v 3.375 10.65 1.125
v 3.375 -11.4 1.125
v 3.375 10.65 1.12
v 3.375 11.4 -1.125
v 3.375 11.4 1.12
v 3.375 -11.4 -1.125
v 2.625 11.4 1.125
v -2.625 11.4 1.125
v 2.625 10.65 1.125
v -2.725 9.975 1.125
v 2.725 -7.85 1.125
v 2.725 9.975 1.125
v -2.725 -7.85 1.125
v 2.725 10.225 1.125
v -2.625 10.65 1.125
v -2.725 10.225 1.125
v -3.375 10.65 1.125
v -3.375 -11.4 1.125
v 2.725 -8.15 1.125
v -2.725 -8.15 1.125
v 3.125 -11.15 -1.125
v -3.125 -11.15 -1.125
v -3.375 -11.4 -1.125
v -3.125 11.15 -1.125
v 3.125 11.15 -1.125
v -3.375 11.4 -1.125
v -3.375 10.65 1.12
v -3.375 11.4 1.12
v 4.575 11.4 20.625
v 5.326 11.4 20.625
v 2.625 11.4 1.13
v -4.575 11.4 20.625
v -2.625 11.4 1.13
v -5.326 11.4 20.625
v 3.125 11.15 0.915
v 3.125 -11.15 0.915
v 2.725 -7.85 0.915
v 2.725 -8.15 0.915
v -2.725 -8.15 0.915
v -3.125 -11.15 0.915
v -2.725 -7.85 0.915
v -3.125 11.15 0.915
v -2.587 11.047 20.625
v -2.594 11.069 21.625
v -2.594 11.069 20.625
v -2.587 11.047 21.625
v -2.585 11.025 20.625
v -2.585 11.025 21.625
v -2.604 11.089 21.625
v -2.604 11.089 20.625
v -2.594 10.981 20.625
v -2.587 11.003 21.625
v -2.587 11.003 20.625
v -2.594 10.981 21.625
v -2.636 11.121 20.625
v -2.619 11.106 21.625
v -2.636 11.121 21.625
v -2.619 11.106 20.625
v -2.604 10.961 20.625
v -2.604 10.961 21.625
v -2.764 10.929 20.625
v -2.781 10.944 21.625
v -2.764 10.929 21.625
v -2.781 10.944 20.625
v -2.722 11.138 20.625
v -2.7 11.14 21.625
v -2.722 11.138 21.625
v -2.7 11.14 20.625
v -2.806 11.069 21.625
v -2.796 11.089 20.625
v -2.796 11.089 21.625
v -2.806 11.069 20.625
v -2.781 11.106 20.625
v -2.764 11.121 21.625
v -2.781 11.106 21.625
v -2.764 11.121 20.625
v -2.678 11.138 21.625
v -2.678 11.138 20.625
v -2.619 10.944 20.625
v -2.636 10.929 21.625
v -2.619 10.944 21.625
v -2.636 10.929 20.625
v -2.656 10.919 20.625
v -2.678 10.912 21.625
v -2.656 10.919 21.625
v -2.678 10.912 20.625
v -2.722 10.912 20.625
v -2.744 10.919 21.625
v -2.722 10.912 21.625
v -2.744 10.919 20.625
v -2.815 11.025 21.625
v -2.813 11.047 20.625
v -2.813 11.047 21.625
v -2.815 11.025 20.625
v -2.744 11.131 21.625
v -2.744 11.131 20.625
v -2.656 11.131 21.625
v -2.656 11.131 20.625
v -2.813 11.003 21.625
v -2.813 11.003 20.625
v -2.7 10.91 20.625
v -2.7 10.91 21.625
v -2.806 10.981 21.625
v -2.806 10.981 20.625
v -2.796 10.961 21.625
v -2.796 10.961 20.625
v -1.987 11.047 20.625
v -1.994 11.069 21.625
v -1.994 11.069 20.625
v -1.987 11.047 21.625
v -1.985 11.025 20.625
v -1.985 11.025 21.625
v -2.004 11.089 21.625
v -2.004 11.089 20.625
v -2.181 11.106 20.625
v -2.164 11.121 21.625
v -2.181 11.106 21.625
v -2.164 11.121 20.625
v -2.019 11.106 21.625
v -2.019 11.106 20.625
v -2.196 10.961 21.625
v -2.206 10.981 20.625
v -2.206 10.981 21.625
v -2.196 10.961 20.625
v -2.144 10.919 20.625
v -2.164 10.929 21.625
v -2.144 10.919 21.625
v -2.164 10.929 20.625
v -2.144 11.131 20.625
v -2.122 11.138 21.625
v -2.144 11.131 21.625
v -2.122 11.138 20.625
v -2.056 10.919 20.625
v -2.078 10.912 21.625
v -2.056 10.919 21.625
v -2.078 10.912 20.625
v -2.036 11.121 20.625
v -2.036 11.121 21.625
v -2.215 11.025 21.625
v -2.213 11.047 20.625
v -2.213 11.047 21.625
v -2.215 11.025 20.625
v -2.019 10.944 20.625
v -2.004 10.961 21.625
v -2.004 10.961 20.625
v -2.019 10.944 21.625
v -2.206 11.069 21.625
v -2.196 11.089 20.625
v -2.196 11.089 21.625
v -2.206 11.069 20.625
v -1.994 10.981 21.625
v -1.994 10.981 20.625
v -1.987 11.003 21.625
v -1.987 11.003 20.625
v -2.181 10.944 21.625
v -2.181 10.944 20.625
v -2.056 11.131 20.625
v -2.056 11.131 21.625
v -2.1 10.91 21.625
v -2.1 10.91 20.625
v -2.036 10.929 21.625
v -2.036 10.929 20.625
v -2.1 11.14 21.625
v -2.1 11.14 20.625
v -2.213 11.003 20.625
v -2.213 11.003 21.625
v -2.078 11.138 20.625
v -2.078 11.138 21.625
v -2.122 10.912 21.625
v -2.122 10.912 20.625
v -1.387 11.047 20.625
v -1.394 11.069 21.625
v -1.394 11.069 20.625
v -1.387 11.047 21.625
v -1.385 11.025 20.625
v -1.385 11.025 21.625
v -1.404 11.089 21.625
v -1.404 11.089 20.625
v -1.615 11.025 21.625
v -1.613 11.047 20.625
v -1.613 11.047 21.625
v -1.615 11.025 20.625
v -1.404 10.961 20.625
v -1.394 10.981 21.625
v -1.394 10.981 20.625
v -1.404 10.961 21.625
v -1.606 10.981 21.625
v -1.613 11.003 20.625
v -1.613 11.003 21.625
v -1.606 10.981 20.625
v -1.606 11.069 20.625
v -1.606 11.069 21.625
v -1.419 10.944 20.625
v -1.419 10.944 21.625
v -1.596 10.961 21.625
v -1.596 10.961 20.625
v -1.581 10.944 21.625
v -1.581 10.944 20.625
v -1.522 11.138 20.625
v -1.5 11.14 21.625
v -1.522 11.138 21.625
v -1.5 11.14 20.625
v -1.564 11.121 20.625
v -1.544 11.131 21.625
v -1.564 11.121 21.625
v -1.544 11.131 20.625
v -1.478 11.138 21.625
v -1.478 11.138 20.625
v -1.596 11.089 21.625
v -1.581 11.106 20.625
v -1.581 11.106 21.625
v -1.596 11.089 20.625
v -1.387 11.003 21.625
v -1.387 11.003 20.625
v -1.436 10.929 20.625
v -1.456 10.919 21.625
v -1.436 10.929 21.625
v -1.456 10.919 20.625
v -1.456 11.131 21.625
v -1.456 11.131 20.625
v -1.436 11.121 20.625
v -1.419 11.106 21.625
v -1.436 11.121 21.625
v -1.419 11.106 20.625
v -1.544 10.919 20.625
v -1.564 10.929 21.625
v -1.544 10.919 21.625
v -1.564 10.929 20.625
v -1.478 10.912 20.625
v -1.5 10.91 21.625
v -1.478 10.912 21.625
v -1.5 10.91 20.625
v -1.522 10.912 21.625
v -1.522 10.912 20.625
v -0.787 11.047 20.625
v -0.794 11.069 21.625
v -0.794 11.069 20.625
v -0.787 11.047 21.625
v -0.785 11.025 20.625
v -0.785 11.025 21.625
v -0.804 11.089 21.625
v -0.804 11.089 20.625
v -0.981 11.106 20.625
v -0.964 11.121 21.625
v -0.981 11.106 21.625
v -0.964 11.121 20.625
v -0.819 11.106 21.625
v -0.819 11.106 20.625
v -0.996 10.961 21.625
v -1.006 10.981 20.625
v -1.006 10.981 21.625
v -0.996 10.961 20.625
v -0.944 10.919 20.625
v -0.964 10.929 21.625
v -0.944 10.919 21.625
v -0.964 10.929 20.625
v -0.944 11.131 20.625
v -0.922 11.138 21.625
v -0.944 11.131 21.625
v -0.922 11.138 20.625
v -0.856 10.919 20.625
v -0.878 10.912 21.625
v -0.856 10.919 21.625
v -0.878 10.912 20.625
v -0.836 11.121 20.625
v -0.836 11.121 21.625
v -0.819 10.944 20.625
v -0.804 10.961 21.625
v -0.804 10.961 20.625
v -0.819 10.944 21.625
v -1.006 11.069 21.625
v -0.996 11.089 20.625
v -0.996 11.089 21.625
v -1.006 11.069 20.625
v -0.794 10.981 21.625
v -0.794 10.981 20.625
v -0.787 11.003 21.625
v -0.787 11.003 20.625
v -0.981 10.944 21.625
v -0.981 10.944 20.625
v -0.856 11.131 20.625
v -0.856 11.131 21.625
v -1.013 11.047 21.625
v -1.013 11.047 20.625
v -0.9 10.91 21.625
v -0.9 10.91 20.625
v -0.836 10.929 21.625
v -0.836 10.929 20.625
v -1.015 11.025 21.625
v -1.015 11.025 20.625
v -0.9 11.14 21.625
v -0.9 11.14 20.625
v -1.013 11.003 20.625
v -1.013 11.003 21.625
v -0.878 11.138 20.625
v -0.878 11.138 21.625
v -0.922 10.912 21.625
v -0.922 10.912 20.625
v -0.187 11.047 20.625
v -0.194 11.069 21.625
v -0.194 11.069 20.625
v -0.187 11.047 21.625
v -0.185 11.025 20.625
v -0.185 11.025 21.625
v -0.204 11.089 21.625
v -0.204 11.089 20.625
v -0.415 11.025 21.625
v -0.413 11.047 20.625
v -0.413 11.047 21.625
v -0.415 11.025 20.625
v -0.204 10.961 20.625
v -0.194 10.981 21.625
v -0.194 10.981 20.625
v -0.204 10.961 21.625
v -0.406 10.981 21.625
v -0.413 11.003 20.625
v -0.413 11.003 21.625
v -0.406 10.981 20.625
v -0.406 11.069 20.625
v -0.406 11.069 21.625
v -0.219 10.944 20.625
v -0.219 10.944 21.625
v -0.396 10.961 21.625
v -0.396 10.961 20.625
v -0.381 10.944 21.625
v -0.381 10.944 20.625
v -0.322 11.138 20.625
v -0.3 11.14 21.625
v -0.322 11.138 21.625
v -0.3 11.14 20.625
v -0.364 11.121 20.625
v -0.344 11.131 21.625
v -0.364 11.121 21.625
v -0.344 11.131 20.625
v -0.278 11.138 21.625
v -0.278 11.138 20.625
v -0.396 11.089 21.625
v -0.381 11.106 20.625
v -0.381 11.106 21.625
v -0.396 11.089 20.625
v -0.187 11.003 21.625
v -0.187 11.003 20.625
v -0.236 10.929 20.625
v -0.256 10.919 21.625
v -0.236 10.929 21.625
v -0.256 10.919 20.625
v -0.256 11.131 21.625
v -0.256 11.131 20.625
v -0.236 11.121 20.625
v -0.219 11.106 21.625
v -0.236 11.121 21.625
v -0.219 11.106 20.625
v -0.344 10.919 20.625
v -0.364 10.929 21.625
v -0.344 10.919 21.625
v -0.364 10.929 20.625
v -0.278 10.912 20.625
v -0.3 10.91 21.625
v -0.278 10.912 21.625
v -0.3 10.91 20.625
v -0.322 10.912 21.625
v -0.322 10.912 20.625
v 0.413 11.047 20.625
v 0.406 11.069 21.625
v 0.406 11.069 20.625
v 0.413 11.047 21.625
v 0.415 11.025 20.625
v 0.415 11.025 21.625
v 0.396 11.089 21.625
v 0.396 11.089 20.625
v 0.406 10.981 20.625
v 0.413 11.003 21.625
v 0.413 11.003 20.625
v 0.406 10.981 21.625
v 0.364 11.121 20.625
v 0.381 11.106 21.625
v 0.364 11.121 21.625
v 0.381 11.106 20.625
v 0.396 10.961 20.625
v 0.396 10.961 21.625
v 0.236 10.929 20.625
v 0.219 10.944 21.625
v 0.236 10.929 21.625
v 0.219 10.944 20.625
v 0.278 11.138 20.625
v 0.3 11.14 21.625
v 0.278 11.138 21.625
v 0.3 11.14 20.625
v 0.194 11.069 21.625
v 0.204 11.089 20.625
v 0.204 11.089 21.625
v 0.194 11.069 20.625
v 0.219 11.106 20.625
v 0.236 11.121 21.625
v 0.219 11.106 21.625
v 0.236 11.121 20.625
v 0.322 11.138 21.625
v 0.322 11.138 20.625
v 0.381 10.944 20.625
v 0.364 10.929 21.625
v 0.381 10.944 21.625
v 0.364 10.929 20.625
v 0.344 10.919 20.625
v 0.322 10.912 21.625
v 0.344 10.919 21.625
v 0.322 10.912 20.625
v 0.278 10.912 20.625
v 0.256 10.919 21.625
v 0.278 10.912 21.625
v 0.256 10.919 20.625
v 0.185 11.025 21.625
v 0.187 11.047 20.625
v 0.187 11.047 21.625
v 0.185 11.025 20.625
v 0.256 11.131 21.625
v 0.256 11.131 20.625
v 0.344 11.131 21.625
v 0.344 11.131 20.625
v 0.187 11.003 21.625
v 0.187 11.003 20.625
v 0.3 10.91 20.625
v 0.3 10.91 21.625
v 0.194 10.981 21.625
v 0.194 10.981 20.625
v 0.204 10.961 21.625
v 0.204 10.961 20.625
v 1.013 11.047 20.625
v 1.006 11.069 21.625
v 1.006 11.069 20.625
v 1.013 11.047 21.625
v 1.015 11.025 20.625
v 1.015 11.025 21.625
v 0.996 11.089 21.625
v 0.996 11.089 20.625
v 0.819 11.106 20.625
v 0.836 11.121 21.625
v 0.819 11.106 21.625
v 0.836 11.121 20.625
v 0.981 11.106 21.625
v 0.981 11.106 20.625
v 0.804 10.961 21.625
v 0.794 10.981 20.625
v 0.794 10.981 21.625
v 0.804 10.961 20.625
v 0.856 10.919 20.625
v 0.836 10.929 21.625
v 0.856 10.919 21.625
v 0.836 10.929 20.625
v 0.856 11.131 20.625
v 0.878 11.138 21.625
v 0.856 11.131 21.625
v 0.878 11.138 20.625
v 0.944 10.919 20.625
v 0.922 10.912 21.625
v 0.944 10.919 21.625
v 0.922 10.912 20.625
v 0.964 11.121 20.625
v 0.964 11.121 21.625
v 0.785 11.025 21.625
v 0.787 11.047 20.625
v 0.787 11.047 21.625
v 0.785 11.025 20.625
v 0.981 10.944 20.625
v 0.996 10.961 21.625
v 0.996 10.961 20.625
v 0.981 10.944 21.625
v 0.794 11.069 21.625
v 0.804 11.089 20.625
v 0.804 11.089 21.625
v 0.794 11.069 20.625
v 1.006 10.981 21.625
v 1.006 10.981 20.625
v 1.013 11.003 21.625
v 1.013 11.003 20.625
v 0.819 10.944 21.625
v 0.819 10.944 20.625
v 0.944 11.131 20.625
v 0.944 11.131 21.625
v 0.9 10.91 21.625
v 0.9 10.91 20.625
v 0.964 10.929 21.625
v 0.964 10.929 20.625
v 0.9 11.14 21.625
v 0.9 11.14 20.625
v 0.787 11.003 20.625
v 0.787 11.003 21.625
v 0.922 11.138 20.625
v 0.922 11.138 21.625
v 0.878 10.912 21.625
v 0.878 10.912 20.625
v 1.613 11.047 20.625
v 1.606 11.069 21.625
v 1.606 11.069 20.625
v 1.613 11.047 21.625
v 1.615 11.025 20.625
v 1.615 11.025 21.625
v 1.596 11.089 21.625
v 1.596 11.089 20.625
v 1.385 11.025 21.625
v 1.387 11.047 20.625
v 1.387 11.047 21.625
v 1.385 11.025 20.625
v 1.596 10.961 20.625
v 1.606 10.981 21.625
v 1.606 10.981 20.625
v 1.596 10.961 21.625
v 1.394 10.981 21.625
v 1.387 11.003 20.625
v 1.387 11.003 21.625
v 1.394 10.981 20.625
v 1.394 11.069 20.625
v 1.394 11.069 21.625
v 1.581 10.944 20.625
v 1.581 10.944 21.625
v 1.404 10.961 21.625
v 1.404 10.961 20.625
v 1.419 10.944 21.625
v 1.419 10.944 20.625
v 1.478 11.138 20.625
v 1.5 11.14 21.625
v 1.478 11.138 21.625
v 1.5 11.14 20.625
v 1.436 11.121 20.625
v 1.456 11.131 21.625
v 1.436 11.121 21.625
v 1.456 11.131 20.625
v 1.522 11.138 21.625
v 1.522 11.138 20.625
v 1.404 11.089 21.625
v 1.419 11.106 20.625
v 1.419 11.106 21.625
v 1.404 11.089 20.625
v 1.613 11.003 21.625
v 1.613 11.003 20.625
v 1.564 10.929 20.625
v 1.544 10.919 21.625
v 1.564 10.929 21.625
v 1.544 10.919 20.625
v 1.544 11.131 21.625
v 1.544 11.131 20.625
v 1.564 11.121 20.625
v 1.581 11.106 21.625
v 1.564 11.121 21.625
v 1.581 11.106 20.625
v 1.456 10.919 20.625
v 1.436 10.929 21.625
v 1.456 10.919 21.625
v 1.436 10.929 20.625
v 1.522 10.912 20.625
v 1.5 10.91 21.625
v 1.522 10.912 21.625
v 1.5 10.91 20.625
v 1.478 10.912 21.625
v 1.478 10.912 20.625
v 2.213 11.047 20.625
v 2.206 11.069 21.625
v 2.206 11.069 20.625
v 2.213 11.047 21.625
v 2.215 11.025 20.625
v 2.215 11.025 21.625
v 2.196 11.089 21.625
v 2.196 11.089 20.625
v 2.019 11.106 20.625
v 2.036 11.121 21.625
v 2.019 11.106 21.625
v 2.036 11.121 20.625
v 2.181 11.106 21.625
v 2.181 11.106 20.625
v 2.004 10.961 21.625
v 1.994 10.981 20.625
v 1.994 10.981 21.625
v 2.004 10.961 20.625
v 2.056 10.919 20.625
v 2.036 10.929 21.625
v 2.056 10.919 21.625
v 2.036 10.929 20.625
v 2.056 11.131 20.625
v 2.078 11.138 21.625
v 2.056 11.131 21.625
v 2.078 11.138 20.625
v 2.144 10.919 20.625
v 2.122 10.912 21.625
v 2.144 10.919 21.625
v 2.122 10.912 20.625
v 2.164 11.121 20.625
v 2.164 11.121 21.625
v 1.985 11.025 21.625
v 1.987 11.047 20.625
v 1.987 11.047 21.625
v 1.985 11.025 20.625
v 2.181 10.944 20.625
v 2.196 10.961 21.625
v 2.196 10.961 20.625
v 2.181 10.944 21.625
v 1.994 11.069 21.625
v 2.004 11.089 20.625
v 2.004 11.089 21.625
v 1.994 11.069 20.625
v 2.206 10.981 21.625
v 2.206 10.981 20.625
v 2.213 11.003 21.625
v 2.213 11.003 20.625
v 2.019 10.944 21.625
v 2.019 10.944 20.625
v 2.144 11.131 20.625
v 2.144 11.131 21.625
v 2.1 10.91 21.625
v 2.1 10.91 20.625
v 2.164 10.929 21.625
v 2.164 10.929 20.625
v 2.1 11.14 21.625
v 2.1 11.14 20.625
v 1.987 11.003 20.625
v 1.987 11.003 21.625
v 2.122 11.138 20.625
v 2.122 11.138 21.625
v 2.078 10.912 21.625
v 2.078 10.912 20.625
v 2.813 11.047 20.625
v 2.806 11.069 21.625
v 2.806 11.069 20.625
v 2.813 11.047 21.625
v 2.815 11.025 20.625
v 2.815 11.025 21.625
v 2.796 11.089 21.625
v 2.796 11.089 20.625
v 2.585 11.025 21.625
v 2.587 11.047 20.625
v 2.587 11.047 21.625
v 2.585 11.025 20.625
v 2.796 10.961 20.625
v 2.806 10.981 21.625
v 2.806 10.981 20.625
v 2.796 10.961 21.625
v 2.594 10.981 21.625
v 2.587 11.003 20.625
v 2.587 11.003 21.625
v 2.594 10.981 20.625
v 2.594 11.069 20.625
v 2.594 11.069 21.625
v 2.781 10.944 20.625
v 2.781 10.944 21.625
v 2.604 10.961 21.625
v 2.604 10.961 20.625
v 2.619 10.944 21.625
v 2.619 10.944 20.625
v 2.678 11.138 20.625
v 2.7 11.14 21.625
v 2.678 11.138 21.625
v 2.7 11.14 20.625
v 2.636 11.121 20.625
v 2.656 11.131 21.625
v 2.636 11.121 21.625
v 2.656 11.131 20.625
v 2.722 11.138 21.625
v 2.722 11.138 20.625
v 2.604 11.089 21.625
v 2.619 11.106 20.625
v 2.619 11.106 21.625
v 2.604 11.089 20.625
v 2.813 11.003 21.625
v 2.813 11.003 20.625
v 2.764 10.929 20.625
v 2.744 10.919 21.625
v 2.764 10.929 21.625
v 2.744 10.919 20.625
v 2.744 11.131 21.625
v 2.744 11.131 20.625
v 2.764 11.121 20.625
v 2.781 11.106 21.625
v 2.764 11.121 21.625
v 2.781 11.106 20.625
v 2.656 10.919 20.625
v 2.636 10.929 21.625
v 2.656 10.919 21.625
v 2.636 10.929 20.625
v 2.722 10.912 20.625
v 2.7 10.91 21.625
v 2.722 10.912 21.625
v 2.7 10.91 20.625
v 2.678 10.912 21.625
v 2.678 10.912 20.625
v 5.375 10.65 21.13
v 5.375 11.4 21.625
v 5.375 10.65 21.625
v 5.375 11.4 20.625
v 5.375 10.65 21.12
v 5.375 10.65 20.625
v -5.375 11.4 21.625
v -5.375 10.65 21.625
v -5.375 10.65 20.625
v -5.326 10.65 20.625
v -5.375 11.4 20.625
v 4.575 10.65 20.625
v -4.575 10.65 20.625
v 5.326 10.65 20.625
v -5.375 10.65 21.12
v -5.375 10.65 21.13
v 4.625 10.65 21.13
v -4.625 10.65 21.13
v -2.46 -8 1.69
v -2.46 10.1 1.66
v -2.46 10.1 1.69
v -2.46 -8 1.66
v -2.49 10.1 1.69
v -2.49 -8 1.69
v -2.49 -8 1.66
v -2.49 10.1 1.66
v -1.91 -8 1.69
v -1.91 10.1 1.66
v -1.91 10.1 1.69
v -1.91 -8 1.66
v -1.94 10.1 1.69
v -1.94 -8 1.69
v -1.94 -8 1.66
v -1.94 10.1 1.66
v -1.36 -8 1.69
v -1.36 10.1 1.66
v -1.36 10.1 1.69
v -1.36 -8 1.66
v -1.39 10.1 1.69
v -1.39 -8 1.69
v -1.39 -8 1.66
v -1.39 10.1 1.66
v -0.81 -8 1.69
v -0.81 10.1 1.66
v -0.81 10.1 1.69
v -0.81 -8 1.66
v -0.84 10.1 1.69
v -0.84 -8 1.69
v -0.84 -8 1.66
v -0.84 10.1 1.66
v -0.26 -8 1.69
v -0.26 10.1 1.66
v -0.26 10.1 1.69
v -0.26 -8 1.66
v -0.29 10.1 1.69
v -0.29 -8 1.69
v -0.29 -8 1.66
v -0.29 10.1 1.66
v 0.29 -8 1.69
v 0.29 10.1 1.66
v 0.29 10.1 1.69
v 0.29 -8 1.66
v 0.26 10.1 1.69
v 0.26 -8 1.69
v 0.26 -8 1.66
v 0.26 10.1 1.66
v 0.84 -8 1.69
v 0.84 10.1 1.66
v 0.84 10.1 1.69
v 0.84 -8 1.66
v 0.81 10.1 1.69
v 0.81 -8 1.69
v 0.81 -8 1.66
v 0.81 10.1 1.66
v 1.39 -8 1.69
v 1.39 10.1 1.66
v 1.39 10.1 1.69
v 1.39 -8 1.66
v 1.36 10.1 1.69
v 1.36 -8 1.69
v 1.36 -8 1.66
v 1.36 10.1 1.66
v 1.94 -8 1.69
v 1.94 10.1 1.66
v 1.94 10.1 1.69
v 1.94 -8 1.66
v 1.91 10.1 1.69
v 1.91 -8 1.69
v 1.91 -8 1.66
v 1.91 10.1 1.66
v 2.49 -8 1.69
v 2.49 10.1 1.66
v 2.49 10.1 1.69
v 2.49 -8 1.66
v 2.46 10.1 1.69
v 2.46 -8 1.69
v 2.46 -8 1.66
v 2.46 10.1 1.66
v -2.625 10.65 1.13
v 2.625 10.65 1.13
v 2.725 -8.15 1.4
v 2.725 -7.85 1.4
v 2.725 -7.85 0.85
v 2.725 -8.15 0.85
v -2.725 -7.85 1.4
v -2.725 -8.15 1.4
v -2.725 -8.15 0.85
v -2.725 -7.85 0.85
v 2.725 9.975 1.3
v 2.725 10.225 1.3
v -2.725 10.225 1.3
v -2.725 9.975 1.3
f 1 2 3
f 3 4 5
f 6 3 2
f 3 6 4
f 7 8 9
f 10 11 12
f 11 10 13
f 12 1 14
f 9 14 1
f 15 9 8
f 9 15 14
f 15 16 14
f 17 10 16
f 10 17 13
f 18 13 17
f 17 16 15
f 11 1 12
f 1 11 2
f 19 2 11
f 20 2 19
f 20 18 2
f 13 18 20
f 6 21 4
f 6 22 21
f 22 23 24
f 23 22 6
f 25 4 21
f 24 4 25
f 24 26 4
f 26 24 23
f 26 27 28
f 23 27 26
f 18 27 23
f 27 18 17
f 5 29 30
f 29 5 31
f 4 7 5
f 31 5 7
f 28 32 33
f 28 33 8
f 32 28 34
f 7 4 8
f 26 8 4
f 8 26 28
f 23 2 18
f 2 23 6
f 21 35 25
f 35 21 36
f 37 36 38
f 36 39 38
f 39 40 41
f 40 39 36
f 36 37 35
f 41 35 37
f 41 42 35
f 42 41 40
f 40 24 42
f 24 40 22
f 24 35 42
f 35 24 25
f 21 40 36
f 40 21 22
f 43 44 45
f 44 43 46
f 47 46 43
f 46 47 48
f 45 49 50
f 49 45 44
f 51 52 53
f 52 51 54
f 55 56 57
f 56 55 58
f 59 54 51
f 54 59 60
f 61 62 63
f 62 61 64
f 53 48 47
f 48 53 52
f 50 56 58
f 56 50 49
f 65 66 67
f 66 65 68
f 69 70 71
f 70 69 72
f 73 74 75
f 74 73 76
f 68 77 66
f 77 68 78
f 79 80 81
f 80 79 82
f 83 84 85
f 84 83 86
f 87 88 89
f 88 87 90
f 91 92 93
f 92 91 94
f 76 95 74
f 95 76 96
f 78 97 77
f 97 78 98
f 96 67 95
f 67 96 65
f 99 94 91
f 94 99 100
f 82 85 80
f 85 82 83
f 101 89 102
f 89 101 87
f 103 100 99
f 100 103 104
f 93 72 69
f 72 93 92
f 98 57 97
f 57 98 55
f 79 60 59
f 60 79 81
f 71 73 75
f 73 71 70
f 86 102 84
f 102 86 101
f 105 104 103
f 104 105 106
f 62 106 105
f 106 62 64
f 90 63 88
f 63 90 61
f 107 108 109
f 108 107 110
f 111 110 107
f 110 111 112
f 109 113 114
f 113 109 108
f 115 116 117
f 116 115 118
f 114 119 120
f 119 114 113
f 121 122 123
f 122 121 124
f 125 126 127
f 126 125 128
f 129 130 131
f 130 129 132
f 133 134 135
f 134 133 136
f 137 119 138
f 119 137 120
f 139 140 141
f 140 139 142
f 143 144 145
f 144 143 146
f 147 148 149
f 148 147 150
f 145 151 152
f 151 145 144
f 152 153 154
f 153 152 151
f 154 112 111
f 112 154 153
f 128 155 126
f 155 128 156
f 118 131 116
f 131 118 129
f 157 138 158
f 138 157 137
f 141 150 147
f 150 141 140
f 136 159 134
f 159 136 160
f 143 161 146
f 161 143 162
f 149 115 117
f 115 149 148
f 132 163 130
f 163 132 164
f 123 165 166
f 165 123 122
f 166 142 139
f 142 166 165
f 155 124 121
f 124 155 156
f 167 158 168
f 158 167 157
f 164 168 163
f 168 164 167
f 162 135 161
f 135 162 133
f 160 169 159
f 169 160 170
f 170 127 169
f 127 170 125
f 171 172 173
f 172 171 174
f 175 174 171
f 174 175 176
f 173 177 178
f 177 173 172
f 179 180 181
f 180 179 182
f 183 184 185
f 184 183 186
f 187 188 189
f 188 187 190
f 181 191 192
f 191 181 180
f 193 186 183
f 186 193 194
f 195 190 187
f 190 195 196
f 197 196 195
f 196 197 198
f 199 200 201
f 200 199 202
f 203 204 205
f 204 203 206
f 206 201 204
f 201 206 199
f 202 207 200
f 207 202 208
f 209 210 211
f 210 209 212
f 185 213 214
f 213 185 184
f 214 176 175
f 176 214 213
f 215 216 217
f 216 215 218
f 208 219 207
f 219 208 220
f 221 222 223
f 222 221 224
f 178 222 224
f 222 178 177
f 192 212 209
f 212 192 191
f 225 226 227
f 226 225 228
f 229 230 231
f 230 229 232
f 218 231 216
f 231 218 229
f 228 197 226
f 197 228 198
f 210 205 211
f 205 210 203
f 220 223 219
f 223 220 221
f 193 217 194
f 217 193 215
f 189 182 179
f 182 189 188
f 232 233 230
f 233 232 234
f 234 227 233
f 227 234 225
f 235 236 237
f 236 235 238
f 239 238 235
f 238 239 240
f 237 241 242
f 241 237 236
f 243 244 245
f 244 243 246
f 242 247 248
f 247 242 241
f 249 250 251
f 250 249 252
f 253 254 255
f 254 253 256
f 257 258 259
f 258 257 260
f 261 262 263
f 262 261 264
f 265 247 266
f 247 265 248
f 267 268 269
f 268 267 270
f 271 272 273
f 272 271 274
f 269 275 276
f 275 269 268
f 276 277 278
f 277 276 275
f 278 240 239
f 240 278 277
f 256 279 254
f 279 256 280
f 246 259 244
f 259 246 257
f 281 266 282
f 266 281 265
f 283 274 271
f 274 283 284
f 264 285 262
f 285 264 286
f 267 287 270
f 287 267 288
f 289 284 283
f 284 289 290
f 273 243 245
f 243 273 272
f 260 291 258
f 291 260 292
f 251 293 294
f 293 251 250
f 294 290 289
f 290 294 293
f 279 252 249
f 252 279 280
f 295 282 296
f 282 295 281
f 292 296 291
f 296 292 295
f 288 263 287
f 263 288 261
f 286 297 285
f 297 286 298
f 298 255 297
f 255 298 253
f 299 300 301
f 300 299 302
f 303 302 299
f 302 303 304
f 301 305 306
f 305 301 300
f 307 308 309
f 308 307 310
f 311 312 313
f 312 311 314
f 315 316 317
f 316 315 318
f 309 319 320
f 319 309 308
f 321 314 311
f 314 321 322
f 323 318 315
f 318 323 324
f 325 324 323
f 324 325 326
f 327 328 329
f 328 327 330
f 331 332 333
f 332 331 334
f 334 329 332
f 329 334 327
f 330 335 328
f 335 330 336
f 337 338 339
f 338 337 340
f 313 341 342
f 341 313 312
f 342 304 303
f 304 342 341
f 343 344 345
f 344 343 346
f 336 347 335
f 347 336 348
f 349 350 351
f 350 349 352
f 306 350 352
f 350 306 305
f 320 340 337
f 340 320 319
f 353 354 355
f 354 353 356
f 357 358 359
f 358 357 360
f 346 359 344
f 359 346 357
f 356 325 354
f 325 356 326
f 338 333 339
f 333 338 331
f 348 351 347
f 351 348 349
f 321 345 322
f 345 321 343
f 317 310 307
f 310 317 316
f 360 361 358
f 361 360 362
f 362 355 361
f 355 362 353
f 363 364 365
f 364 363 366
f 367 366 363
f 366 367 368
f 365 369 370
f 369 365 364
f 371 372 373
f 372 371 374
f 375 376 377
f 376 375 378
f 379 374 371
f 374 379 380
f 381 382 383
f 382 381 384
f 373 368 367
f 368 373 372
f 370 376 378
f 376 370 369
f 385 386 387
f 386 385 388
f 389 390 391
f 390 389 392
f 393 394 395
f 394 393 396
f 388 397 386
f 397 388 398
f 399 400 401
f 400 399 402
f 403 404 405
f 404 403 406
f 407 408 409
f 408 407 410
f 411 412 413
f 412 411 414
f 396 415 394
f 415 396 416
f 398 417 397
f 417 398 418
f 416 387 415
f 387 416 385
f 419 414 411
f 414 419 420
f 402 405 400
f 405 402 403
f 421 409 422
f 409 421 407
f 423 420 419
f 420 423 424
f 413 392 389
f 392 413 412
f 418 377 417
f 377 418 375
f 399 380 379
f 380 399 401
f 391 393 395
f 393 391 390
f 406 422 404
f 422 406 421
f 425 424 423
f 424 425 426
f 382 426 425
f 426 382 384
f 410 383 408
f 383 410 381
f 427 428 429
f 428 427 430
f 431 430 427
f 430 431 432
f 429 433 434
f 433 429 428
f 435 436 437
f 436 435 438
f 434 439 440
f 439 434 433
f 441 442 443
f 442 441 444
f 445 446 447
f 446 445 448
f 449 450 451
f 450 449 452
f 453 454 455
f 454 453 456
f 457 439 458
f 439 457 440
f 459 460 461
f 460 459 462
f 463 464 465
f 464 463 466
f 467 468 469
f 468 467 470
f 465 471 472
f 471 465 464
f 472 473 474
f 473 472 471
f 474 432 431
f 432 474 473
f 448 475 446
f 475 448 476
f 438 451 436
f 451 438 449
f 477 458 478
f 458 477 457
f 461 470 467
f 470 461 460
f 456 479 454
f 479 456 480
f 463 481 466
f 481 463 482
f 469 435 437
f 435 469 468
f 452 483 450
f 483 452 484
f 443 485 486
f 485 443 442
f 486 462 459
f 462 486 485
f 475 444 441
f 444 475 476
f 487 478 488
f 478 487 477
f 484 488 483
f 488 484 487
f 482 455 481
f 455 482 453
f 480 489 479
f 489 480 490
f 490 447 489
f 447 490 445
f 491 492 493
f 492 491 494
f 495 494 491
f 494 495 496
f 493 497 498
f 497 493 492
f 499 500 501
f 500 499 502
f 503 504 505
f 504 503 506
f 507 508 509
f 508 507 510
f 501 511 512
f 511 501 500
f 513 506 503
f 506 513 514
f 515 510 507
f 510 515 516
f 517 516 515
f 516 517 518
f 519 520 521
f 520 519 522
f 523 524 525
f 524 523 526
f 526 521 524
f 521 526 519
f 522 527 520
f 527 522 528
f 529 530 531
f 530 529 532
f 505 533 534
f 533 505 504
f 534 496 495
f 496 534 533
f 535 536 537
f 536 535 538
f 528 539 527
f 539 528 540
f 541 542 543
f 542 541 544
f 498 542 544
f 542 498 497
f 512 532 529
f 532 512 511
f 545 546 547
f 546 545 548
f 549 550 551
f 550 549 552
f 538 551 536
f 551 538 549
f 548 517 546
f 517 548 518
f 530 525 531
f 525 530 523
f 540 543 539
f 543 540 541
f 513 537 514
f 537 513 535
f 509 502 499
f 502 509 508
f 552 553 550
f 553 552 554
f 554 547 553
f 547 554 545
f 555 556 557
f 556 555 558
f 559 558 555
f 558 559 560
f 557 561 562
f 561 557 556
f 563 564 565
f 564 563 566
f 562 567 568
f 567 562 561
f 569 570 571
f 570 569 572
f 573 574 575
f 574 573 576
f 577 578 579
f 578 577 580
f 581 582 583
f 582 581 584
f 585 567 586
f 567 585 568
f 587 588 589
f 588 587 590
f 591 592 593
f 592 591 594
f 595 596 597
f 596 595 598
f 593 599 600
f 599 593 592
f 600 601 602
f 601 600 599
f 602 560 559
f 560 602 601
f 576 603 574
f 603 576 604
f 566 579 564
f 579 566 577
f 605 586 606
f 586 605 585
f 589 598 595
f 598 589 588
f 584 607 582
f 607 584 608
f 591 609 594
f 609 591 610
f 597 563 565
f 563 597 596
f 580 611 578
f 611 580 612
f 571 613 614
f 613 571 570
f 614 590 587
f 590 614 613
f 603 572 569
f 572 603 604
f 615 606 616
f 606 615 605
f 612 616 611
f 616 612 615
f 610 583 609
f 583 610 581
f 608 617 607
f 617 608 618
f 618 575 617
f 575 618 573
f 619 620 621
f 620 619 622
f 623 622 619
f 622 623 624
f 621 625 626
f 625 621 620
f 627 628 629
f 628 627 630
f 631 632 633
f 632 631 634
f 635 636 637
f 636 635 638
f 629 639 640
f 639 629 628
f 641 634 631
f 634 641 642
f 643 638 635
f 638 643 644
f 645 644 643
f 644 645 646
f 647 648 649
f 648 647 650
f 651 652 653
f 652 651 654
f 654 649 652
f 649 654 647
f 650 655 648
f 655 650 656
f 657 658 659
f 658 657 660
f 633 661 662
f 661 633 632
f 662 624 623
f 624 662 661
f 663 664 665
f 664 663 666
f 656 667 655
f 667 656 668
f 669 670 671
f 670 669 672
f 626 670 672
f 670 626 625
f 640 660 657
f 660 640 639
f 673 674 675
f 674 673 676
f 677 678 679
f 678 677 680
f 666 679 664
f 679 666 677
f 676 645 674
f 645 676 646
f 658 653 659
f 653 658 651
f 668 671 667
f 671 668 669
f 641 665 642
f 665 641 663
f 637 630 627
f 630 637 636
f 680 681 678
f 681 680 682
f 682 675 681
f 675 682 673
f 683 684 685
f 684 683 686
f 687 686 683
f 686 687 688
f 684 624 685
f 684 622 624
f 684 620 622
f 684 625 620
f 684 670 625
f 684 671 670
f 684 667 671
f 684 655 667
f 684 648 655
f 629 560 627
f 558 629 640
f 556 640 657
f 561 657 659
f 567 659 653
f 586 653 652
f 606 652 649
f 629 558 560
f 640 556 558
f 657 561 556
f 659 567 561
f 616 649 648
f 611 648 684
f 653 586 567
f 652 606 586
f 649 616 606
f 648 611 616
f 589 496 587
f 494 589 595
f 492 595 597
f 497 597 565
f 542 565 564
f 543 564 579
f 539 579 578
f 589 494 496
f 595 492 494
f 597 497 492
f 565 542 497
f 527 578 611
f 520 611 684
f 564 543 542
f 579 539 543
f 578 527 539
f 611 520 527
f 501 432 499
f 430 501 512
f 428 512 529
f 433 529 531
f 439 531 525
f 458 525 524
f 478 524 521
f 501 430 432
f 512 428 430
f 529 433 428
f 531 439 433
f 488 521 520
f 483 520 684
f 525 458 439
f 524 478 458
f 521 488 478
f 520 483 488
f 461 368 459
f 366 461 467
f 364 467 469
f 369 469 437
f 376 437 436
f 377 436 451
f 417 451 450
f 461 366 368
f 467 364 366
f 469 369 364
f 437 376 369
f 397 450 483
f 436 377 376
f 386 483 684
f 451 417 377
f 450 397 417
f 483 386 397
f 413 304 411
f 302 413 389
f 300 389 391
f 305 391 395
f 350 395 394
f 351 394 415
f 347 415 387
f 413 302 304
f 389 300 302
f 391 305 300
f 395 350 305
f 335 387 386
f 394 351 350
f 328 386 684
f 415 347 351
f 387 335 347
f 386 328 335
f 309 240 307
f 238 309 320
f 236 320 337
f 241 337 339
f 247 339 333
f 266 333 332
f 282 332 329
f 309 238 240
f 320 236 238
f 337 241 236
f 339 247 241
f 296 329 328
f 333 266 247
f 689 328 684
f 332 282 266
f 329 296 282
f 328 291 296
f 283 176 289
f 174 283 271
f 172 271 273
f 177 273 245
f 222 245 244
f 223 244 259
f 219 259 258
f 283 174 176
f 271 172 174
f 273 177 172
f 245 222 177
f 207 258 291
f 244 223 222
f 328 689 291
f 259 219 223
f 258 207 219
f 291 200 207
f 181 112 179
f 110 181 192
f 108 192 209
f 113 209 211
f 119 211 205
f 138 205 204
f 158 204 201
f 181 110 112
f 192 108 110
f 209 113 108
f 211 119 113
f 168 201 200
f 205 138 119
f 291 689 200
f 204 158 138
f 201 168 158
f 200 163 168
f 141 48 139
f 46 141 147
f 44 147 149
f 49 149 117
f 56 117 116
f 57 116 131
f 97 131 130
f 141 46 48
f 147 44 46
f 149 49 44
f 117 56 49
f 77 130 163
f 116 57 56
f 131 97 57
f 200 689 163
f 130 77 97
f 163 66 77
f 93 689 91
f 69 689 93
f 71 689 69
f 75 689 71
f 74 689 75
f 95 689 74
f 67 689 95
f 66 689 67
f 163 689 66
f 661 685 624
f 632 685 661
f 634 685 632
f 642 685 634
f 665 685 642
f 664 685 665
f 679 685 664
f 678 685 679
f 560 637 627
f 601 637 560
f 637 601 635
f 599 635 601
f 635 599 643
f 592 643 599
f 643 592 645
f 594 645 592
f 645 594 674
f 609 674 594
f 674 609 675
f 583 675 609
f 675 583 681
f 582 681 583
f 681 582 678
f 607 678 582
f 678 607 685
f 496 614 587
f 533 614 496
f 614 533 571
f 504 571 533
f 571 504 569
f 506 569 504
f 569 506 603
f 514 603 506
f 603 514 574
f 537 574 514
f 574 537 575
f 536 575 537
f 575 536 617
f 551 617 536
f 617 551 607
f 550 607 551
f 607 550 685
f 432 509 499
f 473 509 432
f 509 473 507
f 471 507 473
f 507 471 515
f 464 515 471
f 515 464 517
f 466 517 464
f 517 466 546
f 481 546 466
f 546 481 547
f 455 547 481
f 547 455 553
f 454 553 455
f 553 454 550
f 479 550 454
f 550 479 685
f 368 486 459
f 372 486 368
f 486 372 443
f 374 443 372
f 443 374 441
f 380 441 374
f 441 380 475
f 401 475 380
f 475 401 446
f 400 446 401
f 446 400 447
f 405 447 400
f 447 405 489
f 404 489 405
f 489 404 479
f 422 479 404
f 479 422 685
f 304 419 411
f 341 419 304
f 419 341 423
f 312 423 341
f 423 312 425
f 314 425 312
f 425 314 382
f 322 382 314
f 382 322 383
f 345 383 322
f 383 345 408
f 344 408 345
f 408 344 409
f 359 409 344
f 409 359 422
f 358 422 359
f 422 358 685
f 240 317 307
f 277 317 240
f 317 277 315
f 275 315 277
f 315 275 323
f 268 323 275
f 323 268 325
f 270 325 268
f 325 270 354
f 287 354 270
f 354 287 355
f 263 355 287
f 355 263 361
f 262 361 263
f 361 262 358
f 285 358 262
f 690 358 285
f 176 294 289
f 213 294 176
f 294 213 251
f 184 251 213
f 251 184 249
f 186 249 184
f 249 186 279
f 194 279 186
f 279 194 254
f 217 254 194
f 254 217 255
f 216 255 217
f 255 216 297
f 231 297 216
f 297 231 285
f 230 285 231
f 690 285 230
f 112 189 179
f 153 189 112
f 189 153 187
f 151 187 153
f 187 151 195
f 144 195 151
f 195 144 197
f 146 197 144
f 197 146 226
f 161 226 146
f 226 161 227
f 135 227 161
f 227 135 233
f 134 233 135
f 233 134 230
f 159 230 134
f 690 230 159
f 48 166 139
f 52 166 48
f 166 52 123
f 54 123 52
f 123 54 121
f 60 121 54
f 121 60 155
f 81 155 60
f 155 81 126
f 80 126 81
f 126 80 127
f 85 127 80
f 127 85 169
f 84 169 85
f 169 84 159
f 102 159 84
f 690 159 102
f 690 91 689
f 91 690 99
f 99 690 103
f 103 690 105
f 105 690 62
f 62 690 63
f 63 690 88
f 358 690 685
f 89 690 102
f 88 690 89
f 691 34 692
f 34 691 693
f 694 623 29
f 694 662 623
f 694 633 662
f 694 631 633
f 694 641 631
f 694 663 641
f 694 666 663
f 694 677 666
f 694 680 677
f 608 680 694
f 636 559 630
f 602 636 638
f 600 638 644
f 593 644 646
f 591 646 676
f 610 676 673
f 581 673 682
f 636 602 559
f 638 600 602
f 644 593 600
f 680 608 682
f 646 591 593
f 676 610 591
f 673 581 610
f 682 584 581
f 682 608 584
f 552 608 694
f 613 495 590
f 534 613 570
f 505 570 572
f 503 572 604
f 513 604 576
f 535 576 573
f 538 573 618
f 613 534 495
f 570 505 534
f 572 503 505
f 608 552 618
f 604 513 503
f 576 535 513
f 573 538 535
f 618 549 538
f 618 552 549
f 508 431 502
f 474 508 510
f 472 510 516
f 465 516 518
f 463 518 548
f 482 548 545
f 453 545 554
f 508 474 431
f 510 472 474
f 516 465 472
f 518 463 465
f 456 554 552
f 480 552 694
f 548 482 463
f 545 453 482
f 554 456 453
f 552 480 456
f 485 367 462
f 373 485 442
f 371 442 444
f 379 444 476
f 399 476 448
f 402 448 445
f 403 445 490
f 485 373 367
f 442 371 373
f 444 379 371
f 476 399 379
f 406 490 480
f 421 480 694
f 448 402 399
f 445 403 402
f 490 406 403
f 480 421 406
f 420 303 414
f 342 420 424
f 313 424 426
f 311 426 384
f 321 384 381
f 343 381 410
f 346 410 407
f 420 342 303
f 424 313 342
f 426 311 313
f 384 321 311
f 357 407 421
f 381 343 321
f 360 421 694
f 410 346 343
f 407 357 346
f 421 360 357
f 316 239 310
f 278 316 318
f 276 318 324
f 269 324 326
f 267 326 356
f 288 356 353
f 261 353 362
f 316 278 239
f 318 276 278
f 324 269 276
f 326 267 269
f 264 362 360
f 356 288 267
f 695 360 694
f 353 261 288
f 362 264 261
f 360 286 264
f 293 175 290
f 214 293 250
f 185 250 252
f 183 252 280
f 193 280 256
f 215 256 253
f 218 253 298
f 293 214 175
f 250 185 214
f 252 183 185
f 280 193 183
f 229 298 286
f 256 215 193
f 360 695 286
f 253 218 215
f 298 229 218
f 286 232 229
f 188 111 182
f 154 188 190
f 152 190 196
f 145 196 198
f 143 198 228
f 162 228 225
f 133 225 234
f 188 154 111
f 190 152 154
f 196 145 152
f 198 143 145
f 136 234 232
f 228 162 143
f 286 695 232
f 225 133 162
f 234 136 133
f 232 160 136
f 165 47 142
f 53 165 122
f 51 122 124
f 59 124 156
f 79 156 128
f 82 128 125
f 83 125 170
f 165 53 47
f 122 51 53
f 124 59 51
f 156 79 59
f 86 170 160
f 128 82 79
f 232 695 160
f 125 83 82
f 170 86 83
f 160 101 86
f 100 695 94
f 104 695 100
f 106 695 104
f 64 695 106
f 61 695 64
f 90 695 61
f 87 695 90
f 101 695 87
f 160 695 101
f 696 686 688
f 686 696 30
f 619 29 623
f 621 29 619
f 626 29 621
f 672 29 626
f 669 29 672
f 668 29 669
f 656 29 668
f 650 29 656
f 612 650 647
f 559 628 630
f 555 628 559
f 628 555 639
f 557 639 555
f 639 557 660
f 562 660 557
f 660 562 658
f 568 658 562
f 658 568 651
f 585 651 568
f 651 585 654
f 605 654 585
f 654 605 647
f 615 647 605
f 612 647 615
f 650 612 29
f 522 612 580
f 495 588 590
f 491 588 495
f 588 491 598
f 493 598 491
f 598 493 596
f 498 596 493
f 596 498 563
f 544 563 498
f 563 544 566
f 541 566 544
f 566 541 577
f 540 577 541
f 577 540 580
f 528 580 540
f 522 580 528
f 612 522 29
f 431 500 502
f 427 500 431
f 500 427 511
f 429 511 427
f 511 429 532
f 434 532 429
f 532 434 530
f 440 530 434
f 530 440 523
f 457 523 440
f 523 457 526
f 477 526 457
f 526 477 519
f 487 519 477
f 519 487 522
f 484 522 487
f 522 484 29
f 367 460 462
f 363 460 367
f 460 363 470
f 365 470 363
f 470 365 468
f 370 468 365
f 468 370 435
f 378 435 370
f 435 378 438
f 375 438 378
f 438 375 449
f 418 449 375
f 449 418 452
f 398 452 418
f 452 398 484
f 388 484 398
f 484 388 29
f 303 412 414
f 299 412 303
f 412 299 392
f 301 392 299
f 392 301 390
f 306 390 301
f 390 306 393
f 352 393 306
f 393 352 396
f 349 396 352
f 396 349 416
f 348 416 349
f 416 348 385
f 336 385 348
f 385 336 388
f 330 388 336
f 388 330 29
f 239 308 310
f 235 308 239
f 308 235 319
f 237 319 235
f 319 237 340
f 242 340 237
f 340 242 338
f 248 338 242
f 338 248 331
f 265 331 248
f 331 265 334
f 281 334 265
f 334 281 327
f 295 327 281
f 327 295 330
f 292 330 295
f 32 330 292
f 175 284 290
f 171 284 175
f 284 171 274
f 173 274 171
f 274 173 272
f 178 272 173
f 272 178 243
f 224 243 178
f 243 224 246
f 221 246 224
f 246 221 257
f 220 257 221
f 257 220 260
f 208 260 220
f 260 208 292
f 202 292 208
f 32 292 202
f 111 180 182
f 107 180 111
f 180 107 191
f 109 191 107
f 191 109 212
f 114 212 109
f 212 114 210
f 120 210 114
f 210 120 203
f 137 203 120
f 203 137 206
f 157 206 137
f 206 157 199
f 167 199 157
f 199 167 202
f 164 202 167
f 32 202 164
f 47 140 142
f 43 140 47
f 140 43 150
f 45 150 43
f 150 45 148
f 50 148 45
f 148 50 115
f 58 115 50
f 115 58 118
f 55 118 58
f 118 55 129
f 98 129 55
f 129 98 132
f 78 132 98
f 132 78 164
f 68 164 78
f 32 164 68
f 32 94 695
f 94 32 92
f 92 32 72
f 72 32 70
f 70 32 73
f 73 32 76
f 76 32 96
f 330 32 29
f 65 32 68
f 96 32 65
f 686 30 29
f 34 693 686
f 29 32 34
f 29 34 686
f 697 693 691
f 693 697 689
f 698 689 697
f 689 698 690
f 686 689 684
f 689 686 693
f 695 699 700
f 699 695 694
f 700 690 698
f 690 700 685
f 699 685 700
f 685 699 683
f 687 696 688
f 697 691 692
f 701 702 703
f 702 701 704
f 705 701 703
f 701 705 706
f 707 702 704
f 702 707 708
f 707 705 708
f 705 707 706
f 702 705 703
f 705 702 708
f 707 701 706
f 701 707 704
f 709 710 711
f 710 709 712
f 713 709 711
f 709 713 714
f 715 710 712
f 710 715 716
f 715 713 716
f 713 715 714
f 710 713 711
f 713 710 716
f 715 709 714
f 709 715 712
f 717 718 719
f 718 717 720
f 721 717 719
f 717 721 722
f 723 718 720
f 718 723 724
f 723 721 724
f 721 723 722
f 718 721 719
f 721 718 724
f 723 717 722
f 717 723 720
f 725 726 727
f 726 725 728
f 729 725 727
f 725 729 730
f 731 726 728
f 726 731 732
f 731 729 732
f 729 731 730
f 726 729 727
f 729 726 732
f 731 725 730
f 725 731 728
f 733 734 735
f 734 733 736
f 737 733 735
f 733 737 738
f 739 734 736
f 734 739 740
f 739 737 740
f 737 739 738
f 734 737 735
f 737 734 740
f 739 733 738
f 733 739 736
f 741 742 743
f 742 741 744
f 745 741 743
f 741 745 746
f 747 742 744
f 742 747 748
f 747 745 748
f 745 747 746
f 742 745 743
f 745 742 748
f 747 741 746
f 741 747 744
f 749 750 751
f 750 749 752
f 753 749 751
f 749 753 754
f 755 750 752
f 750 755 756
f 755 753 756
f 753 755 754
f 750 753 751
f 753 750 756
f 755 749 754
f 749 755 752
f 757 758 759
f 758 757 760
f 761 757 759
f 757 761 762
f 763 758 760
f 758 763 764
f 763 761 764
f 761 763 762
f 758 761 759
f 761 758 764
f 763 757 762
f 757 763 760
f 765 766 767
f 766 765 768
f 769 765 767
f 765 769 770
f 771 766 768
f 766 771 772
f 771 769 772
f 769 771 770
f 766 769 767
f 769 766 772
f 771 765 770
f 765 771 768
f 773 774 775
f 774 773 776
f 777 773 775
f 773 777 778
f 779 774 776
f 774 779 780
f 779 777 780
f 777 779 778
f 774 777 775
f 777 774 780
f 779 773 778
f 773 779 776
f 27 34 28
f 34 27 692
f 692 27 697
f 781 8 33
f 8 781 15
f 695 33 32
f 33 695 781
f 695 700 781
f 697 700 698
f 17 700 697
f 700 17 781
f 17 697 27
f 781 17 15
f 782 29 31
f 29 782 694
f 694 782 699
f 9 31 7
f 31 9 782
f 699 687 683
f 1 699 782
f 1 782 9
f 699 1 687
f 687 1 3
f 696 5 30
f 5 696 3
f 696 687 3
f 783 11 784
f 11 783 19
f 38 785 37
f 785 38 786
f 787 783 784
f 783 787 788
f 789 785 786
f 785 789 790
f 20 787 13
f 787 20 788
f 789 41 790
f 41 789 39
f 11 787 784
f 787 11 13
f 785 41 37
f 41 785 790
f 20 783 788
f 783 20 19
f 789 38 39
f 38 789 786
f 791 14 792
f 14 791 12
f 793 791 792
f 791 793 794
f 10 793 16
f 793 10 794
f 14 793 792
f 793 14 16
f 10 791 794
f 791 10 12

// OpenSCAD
// Lyre parametric master — 10-string plucked lyre, prototype baseline.
//
// Authority: pending_measurement. NOT fabrication authority until reviewed
// against measured string-schedule / load-register gates (see
// visual-output-register.csv CAD-001, bridge-soundboard-load-register.csv,
// and cad/mcp-session-log.md).
//
// Dimension sources (do not edit values without updating the source record):
//   - string_count, scale_length_in, tuning: design.md "Baseline Assumptions"
//     table (10 strings, C4-E5 diatonic, 21 in nominal speaking length).
//   - soundboard_thick_in: design.md (0.125-0.160 in) — modeled at 0.140 in
//     midpoint, prototype_assumption; final value is a tap/deflection result
//     (bridge-soundboard-load-register.csv LOAD-040).
//   - frame_stock_in: design.md (0.75 in hardwood, grain continuous through
//     arms — see LOAD-050 joinery gate).
//   - string spacing, arm sweep, body outline: NOT in the design table;
//     prototype_assumption geometry for layout only. Pin row is DERIVED from
//     the string schedule (never hand-placed — README Build Review Checklist).
//
// Units: inches.

/* [Strings] */
string_count      = 10;    // design.md: C4-D4-E4-F4-G4-A4-B4-C5-D5-E5
scale_length_in   = 21.0;  // design.md nominal speaking length (fan 18-23 in)
string_spacing_in = 0.55;  // prototype_assumption (not in design table)
string_dia_in     = 0.030; // nominal monofilament; gauge is measurement_required

/* [Soundboard / body] */
soundboard_thick_in = 0.140; // design.md 0.125-0.160 midpoint (assumption)
body_margin_in      = 0.90;  // soundboard edge past outer strings (assumption)
body_depth_in       = 2.25;  // resonating box depth (prototype_assumption)
side_thick_in       = 0.25;  // box wall (prototype_assumption)

/* [Frame — arms + crossbar/yoke] */
frame_stock_in   = 0.75;  // design.md hardwood frame stock
arm_length_in    = 20.0;  // nut-to-yoke arm run (prototype_assumption)
arm_splay_in     = 2.0;   // each arm leans outboard over its run (assumption)
yoke_thick_in    = 1.00;  // crossbar depth; long-grain load path (LOAD-010)

/* [Bridge / nut / tuning pins] */
bridge_height_in = 0.55;  // downbearing set empirically (LOAD-030, assumption)
nut_height_in    = 0.35;  // prototype_assumption
pin_dia_in       = 0.230; // zither/tuning-pin shank; pilot + torque = LOAD-020
pin_row_pitch_in = 0.60;  // pin spacing along yoke; >= edge-distance gate

// ---------------------------------------------------------------------------
// Derived geometry (formulas, not baked values)
// ---------------------------------------------------------------------------

string_fan_in    = (string_count - 1) * string_spacing_in; // outer-to-outer
soundboard_w_in  = string_fan_in + 2 * body_margin_in;
soundboard_l_in  = scale_length_in + 2 * body_margin_in;

// String x-positions centered on the soundboard centerline (bass -> treble).
function string_x(i) = -string_fan_in / 2 + i * string_spacing_in;
// Pin x-positions derived from the SAME spacing (never independent).
function pin_x(i) = -( (string_count - 1) * pin_row_pitch_in ) / 2
                    + i * pin_row_pitch_in;

module soundbox() {
  difference() {
    cube([soundboard_w_in, soundboard_l_in, body_depth_in], center = true);
    // Hollow the resonating cavity, leaving the soundboard on top (+z).
    translate([0, 0, -(body_depth_in - (body_depth_in - soundboard_thick_in)) / 2
                     - soundboard_thick_in / 2])
      cube([soundboard_w_in - 2 * side_thick_in,
            soundboard_l_in - 2 * side_thick_in,
            body_depth_in - soundboard_thick_in],
           center = true);
  }
}

module arm(side) {
  // side = -1 (bass) or +1 (treble). Arm rises from the body top toward the
  // yoke, splaying outboard. Long grain must run the length (LOAD-050).
  x0 = side * (soundboard_w_in / 2 - frame_stock_in / 2);
  translate([x0, soundboard_l_in / 2 - frame_stock_in / 2, body_depth_in / 2])
    rotate([0, 0, 0])
      hull() {
        cube([frame_stock_in, frame_stock_in, 0.01], center = true);
        translate([side * arm_splay_in, 0, arm_length_in])
          cube([frame_stock_in, frame_stock_in, 0.01], center = true);
      }
}

module yoke() {
  // Crossbar spanning the two arm tops; holds the tuning-pin row.
  span = soundboard_w_in + 2 * arm_splay_in;
  translate([0, soundboard_l_in / 2 - frame_stock_in / 2,
             body_depth_in / 2 + arm_length_in])
    difference() {
      cube([span, frame_stock_in, yoke_thick_in], center = true);
      // Tuning-pin holes derived from the string count.
      for (i = [0 : string_count - 1])
        translate([pin_x(i), 0, 0])
          cylinder(h = yoke_thick_in * 2, d = pin_dia_in, center = true, $fn = 32);
    }
}

module bridge() {
  translate([0, -soundboard_l_in / 2 + body_margin_in + 2.5,
             body_depth_in / 2])
    cube([string_fan_in + 0.5, 0.30, bridge_height_in], center = true);
}

module nut() {
  translate([0, soundboard_l_in / 2 - body_margin_in - 0.4, body_depth_in / 2])
    cube([string_fan_in + 0.5, 0.25, nut_height_in], center = true);
}

module string_reference() {
  // Reference geometry only: bridge (low y) to nut (high y) speaking lengths.
  y_bridge = -soundboard_l_in / 2 + body_margin_in + 2.5;
  y_nut    =  soundboard_l_in / 2 - body_margin_in - 0.4;
  for (i = [0 : string_count - 1])
    translate([string_x(i), (y_bridge + y_nut) / 2,
               body_depth_in / 2 + bridge_height_in])
      cube([string_dia_in, y_nut - y_bridge, string_dia_in], center = true);
}

module lyre_assembly() {
  soundbox();
  arm(-1);
  arm(1);
  yoke();
  bridge();
  nut();
  string_reference();
}

lyre_assembly();

// Echo the derived string layout so `openscad` runs double as a fan check.
echo(str("string_fan_in=", string_fan_in,
         " soundboard_w_in=", soundboard_w_in,
         " soundboard_l_in=", soundboard_l_in));
for (i = [0 : string_count - 1])
  echo(str("string_", i + 1, "_x_in=", string_x(i)));
